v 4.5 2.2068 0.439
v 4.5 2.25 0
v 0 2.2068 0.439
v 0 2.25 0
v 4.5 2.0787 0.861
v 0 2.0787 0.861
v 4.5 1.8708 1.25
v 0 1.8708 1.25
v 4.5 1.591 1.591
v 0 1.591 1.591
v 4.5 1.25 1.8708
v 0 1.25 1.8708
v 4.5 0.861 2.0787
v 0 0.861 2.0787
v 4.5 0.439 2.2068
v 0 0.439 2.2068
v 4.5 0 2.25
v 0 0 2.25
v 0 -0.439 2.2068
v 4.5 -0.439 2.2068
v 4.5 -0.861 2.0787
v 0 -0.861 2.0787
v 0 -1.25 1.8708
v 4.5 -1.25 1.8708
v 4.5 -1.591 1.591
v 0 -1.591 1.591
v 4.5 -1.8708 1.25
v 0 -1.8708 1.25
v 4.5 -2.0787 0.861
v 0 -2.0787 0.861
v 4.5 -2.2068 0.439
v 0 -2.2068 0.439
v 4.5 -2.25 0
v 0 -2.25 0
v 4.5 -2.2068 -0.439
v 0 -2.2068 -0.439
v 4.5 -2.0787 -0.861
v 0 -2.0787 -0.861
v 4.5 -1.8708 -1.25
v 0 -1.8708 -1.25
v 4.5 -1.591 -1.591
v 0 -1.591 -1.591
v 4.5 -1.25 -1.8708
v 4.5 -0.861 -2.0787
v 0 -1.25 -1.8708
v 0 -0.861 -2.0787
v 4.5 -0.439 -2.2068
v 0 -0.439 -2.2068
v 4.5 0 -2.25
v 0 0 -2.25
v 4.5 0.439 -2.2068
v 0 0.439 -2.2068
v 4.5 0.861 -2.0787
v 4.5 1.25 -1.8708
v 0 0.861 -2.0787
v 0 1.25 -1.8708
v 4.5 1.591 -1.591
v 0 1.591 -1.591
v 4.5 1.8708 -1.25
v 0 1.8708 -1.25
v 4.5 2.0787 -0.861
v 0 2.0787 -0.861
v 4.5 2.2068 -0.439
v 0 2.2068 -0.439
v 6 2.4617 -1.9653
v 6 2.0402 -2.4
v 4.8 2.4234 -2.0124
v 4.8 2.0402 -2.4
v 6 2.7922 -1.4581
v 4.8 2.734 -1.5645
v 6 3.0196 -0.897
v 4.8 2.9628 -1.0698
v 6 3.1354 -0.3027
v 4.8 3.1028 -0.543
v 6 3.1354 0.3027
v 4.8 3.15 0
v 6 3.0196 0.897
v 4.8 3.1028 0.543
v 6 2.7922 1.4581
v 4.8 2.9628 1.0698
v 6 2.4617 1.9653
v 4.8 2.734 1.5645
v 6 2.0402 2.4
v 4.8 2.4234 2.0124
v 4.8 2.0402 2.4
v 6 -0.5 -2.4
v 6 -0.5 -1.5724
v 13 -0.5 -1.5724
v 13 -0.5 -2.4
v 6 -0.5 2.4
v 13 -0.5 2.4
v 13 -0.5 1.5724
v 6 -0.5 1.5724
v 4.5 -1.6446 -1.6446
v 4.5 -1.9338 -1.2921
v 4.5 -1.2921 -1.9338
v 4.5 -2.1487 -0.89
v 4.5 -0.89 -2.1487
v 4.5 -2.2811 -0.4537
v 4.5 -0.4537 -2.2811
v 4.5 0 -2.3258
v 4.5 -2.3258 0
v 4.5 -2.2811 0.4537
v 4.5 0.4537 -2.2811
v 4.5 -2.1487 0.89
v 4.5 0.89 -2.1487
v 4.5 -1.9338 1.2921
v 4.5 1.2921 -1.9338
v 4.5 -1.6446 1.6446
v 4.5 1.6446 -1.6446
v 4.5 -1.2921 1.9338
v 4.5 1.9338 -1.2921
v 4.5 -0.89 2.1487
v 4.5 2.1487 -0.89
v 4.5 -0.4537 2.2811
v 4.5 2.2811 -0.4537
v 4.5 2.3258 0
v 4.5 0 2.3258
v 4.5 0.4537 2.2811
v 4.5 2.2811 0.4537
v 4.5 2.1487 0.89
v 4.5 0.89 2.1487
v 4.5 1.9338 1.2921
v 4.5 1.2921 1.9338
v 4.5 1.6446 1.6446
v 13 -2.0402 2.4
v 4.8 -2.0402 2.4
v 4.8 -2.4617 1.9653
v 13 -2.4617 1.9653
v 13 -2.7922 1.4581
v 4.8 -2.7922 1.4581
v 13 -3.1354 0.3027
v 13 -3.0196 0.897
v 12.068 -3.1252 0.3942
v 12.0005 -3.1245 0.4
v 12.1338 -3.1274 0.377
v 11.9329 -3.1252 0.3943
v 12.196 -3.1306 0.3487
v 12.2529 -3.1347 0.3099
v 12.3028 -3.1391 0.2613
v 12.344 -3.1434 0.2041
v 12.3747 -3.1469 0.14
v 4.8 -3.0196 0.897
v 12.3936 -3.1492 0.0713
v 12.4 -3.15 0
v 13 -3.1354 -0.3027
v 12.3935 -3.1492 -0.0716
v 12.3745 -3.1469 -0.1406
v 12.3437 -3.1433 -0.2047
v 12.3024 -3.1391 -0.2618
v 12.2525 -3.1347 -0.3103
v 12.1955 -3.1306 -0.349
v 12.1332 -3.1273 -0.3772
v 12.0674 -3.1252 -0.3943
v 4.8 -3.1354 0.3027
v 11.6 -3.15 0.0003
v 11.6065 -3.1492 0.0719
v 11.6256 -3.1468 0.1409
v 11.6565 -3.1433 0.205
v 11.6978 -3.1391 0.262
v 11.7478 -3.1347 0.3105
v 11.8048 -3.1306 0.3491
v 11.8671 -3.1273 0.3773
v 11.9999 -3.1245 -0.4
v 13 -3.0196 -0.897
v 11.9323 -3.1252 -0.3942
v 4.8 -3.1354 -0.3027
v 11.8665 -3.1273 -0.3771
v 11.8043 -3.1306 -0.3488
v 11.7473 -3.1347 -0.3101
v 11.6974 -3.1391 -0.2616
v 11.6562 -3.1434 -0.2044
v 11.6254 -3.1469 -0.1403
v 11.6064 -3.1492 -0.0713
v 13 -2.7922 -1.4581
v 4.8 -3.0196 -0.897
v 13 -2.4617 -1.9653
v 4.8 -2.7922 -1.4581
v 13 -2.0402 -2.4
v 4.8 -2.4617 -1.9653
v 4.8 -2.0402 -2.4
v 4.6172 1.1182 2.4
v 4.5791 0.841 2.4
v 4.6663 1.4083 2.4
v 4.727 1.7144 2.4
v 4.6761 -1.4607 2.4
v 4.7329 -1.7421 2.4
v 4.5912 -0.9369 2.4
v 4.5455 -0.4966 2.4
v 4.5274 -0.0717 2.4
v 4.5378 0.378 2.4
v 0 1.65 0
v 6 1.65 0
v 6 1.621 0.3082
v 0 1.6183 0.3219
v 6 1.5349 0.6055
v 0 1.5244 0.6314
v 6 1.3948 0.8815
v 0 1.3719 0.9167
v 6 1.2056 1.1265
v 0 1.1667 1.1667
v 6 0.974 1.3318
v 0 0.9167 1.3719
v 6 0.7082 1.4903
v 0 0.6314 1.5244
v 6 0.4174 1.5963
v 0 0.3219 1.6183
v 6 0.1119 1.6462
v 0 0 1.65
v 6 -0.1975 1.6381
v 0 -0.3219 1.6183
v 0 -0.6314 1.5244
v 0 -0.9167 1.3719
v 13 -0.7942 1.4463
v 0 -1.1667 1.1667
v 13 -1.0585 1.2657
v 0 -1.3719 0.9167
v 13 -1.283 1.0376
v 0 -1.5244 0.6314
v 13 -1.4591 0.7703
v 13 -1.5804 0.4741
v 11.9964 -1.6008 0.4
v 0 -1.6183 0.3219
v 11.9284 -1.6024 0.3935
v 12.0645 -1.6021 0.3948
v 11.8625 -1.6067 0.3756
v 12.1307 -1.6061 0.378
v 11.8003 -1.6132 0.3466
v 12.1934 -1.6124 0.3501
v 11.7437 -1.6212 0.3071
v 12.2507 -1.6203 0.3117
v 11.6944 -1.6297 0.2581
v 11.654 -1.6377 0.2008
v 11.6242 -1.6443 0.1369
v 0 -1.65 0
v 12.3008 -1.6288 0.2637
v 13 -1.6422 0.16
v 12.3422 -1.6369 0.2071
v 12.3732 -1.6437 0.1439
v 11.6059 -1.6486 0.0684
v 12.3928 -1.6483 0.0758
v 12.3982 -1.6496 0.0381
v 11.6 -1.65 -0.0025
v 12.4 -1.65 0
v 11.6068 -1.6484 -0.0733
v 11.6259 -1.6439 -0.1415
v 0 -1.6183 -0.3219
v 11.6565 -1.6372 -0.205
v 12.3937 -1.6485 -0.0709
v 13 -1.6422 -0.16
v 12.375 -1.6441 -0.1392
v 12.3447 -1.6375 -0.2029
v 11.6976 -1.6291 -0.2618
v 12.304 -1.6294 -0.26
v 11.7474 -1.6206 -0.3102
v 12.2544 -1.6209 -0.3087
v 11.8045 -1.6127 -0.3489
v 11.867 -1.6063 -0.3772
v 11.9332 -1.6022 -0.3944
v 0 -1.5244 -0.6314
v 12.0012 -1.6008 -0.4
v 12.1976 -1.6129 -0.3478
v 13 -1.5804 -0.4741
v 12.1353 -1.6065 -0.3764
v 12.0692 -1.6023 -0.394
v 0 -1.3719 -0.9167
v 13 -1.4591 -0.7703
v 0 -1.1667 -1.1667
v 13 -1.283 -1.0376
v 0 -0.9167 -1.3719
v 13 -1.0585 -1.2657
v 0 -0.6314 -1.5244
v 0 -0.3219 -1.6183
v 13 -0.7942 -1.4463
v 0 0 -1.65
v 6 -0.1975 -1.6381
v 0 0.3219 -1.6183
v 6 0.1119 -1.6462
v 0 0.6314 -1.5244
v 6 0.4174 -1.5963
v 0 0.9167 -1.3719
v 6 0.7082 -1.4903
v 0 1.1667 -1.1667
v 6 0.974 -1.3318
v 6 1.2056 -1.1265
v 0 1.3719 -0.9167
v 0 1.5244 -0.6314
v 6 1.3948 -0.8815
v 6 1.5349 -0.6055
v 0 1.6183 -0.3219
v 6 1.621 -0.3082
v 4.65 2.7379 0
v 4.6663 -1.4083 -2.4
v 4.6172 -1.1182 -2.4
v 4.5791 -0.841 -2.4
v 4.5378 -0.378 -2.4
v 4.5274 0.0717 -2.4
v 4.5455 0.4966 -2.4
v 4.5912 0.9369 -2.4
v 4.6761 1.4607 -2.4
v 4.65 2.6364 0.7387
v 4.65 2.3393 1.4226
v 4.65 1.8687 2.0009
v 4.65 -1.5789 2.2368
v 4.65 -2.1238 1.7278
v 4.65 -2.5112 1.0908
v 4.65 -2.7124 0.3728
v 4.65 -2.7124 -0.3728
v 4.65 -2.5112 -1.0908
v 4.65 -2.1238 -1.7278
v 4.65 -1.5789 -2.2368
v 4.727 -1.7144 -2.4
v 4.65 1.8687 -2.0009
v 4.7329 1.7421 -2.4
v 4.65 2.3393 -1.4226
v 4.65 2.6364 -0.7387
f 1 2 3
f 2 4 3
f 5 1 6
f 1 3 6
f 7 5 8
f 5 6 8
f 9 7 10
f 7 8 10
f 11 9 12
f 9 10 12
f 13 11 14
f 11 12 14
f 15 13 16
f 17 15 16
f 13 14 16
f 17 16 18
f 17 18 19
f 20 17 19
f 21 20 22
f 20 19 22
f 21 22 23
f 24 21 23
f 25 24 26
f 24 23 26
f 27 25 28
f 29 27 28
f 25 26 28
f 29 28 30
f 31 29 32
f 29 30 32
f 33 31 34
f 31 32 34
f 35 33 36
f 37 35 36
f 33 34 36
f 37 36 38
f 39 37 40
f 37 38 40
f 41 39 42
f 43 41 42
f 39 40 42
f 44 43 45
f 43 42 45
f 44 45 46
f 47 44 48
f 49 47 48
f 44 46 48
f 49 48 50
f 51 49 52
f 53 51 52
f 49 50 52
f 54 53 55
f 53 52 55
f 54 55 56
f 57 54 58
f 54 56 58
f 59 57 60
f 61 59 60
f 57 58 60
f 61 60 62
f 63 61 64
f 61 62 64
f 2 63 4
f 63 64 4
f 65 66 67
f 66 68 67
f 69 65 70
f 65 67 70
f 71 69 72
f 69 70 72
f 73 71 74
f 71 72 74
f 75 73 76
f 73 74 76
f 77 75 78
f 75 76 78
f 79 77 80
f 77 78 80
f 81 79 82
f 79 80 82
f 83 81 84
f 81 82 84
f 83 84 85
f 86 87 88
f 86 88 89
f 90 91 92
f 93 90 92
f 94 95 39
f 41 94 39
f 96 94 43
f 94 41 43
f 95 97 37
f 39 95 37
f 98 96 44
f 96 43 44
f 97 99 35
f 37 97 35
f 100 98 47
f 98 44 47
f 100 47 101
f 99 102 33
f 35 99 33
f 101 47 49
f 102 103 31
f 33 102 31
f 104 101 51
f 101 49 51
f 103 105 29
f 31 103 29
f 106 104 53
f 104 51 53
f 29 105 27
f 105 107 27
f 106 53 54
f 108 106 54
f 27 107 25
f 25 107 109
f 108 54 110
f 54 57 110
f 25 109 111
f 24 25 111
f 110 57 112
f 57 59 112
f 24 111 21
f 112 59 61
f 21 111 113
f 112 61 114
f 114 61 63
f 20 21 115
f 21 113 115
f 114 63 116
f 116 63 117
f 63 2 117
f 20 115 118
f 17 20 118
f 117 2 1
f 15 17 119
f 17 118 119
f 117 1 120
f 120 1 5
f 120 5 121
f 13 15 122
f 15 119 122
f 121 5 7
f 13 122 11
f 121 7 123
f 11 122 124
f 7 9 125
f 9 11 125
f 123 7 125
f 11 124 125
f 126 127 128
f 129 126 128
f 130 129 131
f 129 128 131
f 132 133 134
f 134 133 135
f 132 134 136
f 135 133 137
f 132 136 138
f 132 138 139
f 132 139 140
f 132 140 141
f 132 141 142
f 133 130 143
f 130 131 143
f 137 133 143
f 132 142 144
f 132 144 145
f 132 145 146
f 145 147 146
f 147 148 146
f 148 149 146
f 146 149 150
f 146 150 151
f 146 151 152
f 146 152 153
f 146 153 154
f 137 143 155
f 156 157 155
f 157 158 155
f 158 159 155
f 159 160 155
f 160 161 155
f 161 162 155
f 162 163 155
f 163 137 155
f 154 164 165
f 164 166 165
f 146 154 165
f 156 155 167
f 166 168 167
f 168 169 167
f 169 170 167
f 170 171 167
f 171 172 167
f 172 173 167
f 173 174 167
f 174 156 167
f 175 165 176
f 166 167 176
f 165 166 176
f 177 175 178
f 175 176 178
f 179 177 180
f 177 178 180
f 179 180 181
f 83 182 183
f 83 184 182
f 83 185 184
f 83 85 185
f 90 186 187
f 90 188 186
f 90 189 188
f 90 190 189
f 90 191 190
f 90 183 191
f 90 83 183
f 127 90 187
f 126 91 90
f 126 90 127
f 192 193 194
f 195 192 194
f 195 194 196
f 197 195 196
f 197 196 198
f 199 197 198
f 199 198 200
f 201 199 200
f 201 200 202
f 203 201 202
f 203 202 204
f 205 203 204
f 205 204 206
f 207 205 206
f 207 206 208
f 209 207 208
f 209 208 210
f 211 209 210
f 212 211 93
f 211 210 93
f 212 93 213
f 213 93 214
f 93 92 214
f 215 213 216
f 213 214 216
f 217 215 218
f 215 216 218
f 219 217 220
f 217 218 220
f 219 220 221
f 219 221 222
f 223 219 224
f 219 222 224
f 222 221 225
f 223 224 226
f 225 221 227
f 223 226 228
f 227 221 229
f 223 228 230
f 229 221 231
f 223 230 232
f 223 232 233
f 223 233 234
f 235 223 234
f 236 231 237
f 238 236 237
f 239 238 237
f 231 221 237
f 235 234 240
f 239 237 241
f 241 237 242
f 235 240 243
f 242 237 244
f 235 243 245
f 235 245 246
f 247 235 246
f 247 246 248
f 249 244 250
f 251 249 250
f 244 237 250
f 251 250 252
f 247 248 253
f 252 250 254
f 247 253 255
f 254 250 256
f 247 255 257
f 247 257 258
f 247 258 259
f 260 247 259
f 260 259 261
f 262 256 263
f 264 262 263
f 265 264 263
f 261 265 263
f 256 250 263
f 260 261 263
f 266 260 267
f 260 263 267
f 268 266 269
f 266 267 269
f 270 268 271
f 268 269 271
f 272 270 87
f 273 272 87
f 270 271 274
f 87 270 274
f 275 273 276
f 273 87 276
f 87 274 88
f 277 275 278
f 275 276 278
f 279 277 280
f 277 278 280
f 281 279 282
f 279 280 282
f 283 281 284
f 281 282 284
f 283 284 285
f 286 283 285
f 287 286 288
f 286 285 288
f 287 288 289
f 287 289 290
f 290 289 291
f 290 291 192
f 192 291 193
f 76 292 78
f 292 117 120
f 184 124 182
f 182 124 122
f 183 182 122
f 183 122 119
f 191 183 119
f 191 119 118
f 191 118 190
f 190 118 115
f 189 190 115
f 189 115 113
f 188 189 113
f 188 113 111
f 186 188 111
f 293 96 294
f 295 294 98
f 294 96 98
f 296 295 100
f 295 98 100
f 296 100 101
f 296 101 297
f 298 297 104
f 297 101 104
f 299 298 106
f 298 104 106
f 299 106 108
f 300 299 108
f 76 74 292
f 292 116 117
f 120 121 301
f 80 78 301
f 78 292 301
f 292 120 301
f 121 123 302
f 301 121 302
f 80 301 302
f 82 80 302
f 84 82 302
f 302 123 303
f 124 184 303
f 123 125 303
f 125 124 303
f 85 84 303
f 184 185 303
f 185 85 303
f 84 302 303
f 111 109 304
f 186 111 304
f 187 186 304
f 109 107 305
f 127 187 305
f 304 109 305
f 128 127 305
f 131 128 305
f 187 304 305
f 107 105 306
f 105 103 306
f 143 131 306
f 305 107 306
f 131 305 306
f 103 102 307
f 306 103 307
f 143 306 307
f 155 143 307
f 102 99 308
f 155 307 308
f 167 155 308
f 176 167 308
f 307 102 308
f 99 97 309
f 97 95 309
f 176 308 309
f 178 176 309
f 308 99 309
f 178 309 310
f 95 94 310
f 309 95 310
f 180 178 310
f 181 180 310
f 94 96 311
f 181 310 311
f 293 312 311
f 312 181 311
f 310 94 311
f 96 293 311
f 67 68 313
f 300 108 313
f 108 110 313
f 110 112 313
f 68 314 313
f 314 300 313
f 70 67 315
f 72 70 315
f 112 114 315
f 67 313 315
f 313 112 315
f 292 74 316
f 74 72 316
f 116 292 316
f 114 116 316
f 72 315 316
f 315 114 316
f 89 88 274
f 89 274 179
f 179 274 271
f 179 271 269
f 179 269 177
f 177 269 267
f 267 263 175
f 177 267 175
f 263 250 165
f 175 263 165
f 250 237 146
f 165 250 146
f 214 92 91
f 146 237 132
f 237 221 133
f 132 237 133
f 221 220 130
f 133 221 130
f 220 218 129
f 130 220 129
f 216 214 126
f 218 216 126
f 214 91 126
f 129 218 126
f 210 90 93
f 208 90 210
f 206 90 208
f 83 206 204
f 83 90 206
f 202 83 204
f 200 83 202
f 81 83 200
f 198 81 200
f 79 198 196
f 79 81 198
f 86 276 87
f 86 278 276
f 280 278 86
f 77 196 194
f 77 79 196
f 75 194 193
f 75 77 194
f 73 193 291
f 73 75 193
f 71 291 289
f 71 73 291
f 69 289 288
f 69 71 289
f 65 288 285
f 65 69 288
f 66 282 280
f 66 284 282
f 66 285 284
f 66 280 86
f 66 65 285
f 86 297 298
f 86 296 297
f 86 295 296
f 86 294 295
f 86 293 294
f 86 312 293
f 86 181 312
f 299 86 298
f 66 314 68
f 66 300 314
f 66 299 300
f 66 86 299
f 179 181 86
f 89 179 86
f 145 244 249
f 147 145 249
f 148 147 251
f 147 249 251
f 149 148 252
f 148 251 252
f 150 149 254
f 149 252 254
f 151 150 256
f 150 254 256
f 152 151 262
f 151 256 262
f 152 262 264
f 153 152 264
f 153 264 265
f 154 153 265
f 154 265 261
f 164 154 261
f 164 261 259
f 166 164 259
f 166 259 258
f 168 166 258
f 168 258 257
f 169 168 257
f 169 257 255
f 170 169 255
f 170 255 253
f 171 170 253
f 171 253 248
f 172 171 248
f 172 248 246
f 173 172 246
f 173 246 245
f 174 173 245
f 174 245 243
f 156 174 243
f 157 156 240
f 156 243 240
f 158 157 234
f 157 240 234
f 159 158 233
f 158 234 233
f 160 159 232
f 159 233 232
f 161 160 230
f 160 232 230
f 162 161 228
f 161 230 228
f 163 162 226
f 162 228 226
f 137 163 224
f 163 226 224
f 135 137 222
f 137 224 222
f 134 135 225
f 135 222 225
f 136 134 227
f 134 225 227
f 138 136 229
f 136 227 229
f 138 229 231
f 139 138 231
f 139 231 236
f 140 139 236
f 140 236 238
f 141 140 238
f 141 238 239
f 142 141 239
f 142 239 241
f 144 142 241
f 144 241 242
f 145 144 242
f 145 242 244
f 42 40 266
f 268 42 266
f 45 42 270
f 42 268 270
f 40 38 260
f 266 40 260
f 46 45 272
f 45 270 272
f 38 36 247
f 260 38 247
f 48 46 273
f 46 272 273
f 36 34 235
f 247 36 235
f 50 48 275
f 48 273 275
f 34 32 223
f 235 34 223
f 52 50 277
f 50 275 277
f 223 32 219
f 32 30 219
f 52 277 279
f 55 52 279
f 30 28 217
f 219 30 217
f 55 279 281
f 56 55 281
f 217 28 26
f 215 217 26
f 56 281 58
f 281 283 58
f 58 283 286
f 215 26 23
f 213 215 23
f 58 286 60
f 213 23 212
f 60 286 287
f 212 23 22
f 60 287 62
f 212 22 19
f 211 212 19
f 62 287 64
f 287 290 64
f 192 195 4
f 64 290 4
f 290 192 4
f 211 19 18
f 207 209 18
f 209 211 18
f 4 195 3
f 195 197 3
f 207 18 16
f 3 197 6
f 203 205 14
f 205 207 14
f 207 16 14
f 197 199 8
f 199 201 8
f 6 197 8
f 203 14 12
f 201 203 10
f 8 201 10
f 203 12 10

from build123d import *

# Parameters (mm, degrees)
CUT_EXTRUDE_1_DEPTH      = 7
CHAMFER_1_SIZE           = 0.3
CHAMFER_1_SIZE2          = 0.824243226
SKETCH_3_R               = 0.4
CUT_EXTRUDE_2_DEPTH      = 10
CUT_EXTRUDE_3_DEPTH      = 7.0000001
CUT_EXTRUDE_3_DEPTH_BACK = 8.0000001


with BuildPart() as part:
    # Эскиз1 → Повернуть1 (revolve)
    with BuildSketch(Plane.XY):
        Polygon((0, 1.65), (13, 1.65), (13, 3.15), (4.5, 3.15), (4.5, 2.25), (0, 2.25), align=None)
    revolve(axis=Axis((0, 0, 0), (1, 0, 0)))

    # Эскиз2 → Вырез-Вытянуть1 (cut)
    with BuildSketch(Plane(origin=(13, 0, 0), x_dir=(0, 0, -1), z_dir=(1, 0, 0))):
        Polygon((-27.602946028, -0.5), (-3.110064308, -0.5), (3.110064308, -0.5), (27.602946028, -0.5), (27.602946028, 48.485763441), (-27.602946028, 48.485763441), align=None)
    extrude(amount=-CUT_EXTRUDE_1_DEPTH, mode=Mode.SUBTRACT)

    # Фаска1
    chamfer_1_edges = [part.edges().sort_by_distance(p)[0] for p in [
        (4.5, -3.15, 0),
    ]]
    chamfer_1_side = [part.faces().sort_by_distance(p)[0] for p in [
        (8.75, -3.15, 0),
    ]]
    chamfer(chamfer_1_edges, length=CHAMFER_1_SIZE, length2=CHAMFER_1_SIZE2, reference=chamfer_1_side[0])

    # Эскиз3 → Вырез-Вытянуть2 (cut)
    with BuildSketch(Plane(origin=(0, -0.5, 0), x_dir=(1, 0, 0), z_dir=(0, 1, 0))):
        with Locations((12, 0)):
            Circle(SKETCH_3_R)
    extrude(amount=-CUT_EXTRUDE_2_DEPTH, mode=Mode.SUBTRACT)

    # Эскиз4 → Вырез-Вытянуть3 (cut, two sides)
    with BuildSketch(Plane.ZY.offset(-6)) as cut_extrude_3_sk:
        with BuildLine():
            ThreePointArc((-3.110064308, -0.5), (-3.033707684, 0.84800807), (-2.4, 2.040220576))
            Line((-2.4, 2.040220576), (-3.699342341, 2.040220576))
            Line((-3.699342341, 2.040220576), (-3.699342341, -2.040220576))
            Line((-3.699342341, -2.040220576), (-2.4, -2.040220576))
            Line((-2.4, -2.040220576), (-2.4, -0.5))
            Line((-2.4, -0.5), (-3.110064308, -0.5))
        make_face()
        with BuildLine():
            Line((4.02795857, 2.040220576), (2.4, 2.040220576))
            ThreePointArc((2.4, 2.040220576), (3.033707684, 0.84800807), (3.110064308, -0.5))
            Line((3.110064308, -0.5), (2.4, -0.5))
            Line((2.4, -0.5), (2.4, -2.040220576))
            Line((2.4, -2.040220576), (4.02795857, -2.040220576))
            Line((4.02795857, -2.040220576), (4.02795857, 2.040220576))
        make_face()
        with BuildLine():
            Line((-2.4, -0.5), (-2.4, 2.040220576))
            ThreePointArc((-2.4, 2.040220576), (-3.033707684, 0.84800807), (-3.110064308, -0.5))
            Line((-3.110064308, -0.5), (-2.4, -0.5))
        make_face()
        with BuildLine():
            ThreePointArc((3.110064308, -0.5), (3.033707684, 0.84800807), (2.4, 2.040220576))
            Line((2.4, 2.040220576), (2.4, -0.5))
            Line((2.4, -0.5), (3.110064308, -0.5))
        make_face()
    extrude(amount=CUT_EXTRUDE_3_DEPTH, mode=Mode.SUBTRACT)
    extrude(cut_extrude_3_sk.sketch, amount=-CUT_EXTRUDE_3_DEPTH_BACK, mode=Mode.SUBTRACT)


solid = part.part
